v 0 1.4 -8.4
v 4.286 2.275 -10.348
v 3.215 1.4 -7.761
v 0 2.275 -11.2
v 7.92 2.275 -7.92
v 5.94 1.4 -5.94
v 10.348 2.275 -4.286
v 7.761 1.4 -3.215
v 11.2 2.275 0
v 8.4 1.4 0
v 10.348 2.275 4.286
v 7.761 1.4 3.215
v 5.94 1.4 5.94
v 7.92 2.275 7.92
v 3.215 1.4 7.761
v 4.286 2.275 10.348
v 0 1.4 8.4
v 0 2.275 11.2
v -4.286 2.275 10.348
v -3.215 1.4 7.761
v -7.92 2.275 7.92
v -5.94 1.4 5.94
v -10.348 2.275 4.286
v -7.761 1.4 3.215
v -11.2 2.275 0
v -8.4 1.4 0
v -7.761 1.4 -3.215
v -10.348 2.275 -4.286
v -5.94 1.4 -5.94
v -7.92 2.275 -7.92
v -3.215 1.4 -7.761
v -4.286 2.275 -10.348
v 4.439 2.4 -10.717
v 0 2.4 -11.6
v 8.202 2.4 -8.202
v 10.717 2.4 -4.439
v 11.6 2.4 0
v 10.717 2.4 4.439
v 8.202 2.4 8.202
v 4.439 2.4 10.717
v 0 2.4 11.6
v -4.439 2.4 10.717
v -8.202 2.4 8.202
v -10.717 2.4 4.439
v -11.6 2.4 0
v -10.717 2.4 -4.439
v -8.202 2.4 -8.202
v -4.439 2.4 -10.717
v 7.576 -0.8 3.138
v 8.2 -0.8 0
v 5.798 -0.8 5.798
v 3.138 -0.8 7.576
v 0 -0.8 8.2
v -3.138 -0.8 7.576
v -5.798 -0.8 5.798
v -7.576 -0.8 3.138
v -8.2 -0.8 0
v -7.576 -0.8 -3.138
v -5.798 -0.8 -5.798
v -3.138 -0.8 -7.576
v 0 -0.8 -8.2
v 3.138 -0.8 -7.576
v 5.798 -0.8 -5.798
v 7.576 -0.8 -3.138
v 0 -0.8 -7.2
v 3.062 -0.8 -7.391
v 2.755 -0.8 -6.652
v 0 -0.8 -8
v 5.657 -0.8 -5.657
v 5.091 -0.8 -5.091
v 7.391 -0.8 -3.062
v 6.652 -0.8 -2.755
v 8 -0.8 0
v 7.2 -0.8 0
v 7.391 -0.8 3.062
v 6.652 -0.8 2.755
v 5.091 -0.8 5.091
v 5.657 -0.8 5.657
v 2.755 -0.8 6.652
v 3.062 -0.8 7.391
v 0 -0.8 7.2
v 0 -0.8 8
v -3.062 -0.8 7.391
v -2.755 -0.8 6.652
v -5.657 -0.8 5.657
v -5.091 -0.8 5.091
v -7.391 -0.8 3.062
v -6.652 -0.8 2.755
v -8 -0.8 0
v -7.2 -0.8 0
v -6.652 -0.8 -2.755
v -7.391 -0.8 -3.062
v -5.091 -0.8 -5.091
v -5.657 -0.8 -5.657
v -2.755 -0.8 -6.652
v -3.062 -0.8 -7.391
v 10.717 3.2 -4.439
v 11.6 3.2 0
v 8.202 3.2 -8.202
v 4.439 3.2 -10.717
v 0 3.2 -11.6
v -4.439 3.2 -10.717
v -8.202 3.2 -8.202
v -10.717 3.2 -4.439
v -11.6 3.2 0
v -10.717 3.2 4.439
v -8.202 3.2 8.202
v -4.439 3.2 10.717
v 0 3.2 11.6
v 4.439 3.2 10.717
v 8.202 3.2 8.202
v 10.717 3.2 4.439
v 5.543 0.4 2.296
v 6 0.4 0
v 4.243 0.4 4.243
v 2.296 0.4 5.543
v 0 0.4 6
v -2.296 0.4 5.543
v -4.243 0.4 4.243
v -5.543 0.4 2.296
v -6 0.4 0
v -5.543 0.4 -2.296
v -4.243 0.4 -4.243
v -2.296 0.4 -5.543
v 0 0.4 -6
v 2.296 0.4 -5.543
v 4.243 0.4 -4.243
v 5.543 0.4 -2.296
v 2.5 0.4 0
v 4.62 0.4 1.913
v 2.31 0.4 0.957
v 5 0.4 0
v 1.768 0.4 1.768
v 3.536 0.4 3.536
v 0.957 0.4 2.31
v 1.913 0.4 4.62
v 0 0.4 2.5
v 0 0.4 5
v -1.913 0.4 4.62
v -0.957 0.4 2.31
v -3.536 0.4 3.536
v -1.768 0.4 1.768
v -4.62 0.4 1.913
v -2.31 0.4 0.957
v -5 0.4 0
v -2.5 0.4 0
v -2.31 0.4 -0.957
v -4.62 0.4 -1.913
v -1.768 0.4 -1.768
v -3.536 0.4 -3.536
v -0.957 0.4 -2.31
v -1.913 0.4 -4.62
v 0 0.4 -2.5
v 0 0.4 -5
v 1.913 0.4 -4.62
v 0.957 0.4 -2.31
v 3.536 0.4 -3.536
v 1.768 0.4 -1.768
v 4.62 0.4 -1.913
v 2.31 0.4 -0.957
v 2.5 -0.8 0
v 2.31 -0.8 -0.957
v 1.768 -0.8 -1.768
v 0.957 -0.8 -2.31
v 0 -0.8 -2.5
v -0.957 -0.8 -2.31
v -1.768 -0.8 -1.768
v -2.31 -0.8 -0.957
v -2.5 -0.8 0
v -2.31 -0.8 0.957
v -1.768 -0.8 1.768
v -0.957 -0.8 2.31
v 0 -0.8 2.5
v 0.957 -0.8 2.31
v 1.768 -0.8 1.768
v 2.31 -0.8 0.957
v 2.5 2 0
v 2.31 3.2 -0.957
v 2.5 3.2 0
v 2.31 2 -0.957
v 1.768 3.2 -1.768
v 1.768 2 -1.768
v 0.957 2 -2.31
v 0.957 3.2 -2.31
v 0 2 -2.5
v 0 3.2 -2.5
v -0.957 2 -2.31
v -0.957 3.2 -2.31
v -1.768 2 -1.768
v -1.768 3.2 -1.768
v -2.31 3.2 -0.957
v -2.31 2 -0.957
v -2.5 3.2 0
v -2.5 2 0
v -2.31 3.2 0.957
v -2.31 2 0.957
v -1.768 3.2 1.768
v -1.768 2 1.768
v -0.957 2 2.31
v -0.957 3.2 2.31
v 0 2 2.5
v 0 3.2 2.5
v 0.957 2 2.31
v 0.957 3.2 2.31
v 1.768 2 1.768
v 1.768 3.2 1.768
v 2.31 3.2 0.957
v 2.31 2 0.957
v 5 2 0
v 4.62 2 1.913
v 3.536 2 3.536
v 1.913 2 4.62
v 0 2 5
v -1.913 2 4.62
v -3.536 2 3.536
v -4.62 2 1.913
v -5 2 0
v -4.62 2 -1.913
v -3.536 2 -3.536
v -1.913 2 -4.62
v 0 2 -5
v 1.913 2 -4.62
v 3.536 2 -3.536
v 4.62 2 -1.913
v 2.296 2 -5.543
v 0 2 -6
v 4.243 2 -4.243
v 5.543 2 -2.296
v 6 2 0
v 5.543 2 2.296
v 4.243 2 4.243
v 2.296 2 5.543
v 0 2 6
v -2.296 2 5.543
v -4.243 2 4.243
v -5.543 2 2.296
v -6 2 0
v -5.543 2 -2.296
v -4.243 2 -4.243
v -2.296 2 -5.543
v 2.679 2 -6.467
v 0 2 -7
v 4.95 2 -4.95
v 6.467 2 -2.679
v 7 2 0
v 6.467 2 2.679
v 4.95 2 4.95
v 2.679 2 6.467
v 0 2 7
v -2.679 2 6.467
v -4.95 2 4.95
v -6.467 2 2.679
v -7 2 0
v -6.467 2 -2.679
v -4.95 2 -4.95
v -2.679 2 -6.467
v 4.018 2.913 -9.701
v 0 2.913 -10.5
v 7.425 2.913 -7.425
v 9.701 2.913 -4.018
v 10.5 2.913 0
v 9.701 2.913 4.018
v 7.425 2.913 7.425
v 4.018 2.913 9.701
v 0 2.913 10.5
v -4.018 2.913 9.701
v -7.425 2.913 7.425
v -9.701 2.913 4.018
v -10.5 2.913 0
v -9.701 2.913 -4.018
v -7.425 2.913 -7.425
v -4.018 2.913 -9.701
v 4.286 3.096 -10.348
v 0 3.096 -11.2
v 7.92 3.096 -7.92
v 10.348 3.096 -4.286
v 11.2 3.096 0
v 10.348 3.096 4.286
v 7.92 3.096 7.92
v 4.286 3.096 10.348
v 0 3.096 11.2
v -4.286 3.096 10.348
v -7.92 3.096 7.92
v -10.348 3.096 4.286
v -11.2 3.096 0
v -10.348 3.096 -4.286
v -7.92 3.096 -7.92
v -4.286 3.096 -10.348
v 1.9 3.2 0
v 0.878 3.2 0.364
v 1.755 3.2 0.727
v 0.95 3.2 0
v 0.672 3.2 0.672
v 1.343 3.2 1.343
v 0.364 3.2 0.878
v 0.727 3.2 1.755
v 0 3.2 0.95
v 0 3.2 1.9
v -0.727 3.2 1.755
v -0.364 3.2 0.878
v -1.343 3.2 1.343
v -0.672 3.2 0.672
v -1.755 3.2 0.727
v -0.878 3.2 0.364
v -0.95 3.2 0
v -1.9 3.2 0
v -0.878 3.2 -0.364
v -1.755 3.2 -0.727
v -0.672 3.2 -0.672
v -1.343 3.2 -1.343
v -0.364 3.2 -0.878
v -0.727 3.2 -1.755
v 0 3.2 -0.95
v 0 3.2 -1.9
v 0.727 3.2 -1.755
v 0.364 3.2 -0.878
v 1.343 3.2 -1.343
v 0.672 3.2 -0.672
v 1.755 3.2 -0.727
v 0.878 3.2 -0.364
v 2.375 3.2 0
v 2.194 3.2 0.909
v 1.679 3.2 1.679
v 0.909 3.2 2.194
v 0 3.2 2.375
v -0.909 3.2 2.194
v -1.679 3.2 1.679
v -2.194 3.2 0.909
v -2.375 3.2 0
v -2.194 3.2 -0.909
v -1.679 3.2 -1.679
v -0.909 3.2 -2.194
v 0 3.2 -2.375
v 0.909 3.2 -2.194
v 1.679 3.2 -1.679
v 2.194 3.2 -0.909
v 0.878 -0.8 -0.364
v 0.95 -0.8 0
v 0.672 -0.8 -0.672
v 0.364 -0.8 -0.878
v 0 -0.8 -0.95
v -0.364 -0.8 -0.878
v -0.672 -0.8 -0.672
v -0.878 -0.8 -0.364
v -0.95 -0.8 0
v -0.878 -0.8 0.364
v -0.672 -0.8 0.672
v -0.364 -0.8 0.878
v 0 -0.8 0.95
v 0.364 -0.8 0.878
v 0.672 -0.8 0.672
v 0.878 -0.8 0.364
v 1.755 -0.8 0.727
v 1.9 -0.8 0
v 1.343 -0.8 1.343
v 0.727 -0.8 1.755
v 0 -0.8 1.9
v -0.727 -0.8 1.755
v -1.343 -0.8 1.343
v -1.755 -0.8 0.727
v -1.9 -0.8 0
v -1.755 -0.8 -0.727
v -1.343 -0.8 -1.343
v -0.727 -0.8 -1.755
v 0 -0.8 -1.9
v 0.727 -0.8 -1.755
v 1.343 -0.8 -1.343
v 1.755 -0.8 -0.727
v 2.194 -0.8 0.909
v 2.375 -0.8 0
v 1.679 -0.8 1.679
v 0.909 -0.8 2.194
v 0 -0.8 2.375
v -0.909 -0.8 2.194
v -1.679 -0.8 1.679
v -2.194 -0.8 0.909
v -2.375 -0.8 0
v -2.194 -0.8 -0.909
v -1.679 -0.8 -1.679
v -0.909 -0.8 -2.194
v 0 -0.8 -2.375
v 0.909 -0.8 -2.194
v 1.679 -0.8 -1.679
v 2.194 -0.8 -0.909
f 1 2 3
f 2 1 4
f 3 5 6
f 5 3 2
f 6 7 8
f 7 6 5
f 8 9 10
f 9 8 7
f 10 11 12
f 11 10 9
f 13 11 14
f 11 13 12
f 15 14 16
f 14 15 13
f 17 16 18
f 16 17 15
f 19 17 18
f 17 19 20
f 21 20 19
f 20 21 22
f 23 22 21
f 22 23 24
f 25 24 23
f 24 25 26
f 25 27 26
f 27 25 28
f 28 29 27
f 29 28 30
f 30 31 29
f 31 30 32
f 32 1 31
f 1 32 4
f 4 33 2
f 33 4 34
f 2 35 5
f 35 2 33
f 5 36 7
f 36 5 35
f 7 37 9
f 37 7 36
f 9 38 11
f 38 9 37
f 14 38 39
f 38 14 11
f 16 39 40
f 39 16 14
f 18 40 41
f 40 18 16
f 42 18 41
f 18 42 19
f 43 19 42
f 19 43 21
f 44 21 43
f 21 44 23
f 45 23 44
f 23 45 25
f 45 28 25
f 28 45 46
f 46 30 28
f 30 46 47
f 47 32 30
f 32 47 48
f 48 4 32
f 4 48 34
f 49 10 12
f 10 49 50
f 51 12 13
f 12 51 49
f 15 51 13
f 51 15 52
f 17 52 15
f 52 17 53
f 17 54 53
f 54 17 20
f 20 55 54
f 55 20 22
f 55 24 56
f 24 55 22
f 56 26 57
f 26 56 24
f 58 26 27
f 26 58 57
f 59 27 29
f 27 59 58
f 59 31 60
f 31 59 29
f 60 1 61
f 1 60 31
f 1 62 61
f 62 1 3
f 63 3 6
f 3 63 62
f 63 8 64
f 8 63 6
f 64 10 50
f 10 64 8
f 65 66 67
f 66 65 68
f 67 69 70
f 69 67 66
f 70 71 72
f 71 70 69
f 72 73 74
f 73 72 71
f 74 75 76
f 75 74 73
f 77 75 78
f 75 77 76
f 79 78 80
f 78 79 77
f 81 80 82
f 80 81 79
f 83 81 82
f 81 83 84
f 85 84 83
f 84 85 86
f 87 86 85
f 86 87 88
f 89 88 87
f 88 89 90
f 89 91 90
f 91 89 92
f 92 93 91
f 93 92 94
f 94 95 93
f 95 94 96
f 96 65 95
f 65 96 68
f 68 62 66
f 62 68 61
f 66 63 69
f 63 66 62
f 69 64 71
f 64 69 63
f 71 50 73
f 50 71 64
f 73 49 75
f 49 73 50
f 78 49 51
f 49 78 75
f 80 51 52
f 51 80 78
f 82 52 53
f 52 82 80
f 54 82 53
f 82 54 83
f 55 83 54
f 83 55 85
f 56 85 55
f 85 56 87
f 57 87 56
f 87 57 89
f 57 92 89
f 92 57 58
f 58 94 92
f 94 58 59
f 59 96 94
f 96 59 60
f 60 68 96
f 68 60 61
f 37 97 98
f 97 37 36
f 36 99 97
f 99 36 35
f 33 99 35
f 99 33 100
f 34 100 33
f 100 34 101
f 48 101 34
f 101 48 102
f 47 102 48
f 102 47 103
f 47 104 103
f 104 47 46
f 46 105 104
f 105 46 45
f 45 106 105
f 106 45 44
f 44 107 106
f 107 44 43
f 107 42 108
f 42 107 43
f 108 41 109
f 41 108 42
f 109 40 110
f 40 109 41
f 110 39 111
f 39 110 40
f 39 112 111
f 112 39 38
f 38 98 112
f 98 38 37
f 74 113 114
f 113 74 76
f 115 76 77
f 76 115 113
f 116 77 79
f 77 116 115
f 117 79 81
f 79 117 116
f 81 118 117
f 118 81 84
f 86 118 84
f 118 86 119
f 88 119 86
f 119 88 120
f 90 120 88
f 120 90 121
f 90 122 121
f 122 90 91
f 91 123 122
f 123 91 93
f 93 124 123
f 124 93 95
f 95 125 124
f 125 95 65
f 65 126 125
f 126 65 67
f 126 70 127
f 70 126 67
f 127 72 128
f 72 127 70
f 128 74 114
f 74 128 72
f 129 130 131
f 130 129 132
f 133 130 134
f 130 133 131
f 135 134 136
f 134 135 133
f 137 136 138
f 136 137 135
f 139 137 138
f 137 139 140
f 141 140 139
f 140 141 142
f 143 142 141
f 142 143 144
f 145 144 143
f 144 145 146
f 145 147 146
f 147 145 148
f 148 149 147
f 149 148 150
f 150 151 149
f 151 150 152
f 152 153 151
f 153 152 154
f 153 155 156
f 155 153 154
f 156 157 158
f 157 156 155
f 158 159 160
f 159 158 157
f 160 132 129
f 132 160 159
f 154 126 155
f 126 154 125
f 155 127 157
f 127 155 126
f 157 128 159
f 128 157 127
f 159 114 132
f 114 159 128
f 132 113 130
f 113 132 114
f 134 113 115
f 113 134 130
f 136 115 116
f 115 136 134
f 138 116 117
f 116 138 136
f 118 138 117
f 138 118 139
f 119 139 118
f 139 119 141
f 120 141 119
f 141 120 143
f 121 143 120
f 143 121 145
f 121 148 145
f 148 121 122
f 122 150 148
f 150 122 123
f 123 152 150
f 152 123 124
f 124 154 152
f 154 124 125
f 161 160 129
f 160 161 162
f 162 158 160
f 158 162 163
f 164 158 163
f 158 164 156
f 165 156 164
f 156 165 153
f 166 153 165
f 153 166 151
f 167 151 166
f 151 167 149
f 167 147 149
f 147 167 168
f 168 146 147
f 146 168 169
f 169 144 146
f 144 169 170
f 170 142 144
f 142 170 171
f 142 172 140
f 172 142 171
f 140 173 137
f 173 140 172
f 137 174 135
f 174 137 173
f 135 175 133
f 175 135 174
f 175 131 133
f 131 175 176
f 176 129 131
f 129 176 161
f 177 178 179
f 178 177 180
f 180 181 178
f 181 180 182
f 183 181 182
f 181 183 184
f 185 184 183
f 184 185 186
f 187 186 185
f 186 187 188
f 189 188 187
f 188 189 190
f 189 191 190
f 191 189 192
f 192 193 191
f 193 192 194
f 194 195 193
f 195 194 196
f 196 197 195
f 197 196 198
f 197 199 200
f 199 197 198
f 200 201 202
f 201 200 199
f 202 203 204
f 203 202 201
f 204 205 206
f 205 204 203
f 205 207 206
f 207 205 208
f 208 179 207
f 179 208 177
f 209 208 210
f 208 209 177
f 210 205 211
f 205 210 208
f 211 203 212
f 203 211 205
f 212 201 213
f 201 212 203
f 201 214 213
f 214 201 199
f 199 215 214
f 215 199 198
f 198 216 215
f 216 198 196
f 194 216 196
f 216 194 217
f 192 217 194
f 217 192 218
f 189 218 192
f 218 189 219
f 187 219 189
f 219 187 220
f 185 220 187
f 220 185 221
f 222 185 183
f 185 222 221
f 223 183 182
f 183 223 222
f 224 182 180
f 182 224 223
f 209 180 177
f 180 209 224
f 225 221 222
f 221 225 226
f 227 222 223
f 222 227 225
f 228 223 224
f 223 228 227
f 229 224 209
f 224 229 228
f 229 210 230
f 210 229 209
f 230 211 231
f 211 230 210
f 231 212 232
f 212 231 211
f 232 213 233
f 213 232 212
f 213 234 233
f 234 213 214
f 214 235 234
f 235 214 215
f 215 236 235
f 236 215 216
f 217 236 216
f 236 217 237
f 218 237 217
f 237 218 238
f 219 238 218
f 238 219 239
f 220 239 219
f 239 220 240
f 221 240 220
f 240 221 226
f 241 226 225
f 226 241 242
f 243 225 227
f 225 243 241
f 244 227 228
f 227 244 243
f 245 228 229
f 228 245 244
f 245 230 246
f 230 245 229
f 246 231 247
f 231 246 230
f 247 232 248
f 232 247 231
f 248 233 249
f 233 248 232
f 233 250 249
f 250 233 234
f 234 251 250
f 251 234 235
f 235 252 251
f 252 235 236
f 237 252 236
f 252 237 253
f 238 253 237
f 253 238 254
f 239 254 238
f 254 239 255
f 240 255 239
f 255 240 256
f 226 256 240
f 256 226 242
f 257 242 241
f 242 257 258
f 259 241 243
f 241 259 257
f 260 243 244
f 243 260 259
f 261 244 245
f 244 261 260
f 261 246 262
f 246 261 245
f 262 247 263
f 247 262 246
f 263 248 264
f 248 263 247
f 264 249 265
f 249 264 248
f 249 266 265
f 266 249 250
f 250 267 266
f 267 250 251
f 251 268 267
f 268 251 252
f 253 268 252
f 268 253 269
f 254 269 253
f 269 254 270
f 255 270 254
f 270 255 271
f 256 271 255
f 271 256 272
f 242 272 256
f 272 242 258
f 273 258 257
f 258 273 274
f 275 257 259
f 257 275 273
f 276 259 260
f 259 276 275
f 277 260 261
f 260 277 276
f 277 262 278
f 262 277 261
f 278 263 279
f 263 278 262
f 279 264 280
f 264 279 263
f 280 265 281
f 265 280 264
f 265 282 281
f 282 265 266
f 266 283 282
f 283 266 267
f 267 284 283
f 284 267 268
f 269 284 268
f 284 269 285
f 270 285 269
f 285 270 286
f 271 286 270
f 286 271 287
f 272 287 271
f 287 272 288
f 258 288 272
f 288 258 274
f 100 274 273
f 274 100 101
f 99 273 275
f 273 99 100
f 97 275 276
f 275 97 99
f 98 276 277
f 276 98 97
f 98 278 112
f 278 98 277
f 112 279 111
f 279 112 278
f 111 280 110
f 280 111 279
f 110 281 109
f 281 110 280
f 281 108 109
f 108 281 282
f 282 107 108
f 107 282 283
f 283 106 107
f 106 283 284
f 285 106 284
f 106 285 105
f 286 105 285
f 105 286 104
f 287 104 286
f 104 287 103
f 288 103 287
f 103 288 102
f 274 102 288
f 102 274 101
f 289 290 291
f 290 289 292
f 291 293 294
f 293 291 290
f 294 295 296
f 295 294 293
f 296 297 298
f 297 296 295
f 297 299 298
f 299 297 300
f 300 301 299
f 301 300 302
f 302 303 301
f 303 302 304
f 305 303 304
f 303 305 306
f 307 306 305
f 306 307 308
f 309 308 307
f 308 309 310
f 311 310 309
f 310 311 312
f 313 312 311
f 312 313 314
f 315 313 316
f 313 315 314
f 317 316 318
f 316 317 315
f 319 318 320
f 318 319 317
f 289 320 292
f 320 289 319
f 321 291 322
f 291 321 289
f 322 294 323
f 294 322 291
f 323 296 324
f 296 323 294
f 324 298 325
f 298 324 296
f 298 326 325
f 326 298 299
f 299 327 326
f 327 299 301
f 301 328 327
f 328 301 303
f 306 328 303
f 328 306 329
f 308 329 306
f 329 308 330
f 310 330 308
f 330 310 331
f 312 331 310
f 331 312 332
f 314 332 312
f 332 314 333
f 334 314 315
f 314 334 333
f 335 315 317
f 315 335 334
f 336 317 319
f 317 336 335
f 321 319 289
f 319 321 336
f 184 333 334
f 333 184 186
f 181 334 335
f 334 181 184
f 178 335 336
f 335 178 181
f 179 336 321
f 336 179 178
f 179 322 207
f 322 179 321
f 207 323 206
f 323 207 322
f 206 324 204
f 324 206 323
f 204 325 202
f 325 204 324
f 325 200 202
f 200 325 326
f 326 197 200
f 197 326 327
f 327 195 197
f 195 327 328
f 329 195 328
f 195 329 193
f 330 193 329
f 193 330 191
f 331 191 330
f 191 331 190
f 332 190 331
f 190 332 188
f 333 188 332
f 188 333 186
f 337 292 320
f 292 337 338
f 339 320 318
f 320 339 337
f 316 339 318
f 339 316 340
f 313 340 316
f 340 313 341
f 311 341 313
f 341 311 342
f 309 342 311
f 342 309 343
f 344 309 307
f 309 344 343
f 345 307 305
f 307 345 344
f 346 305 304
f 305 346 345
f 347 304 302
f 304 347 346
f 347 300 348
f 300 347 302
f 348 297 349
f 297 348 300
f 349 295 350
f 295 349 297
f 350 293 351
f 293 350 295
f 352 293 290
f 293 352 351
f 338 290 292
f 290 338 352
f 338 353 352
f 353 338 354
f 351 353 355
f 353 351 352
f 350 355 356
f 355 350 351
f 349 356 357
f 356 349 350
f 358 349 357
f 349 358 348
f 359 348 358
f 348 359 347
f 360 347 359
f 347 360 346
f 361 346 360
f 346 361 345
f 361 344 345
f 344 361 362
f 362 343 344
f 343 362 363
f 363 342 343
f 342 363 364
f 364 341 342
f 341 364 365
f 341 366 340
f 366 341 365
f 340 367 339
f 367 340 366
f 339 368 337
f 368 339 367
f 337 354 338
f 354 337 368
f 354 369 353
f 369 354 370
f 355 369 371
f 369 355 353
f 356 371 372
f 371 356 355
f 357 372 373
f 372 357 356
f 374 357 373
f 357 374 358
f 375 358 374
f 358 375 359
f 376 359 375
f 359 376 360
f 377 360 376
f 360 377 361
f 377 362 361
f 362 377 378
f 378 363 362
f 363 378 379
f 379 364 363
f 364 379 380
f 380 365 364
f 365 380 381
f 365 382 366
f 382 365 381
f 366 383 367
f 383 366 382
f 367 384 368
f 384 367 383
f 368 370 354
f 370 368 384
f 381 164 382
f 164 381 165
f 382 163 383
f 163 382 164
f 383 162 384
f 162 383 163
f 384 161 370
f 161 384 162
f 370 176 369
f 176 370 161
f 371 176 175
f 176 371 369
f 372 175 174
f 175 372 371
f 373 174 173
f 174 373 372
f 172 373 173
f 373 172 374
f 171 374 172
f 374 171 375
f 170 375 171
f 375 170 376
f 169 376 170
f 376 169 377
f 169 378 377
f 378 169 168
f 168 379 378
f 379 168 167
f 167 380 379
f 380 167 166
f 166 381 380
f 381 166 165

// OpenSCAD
use <../lib.scad>
use <../p/4-4cylo.scad>
use <../p/4-4rin19.scad>
use <../p/4-4ring1.scad>
use <../p/4-4ring4.scad>
use <s/2879s01.scad>
function ldraw_lib__2879() = [
// 0 ~Train Wheel with Open Centre for Wheel Bogie
// 0 Name: 2879.dat
// 0 Author: James Jessiman
// 0 !LDRAW_ORG Part UPDATE 2013-02
// 0 !LICENSE Licensed under CC BY 4.0 : see CAreadme.txt
// 
// 0 BFC CERTIFY CCW
  [0,"BFC","CERTIFY"],
  [0,"BFC","CCW"],
// 
// 0 !HISTORY 2002-12-12 [cwdee] Updated header, minor corrections, BFC compliance
// 0 !HISTORY 2003-01-12 [cwdee] Increased use of primtives, recalculated outer cone
// 0 !HISTORY 2003-12-19 [PTadmin] Official Update 2003-03
// 0 !HISTORY 2007-05-20 [PTadmin] Header formatted for Contributor Agreement
// 0 !HISTORY 2008-07-01 [PTadmin] Official Update 2008-01
// 0 !HISTORY 2013-06-29 [MMR1988] Used reworked Subfile
// 0 !HISTORY 2013-12-23 [PTadmin] Official Update 2013-02
// 
// 
// 1 16 0 0 0 1 0 0 0 1 0 0 0 1 s\2879s01.dat
  [1,16,0,0,0,1,0,0,0,1,0,0,0,1, ldraw_lib__s__2879s01()],
// 
// 1 16 0 0 8 0 0 2.375 2.375 0 0 0 -1 0 4-4ring1.dat
  [1,16,0,0,8,0,0,2.375,2.375,0,0,0,-1,0, ldraw_lib__4_4ring1()],
// 1 16 0 0 8 0 0 1.1875 1.1875 0 0 0 -1 0 4-4ring4.dat
  [1,16,0,0,8,0,0,1.1875,1.1875,0,0,0,-1,0, ldraw_lib__4_4ring4()],
// 1 16 0 0 8 0 0 0.3125 0.3125 0 0 0 -1 0 4-4rin19.dat
  [1,16,0,0,8,0,0,0.3125,0.3125,0,0,0,-1,0, ldraw_lib__4_4rin19()],
// 0 BFC INVERTNEXT
  [0,"BFC","INVERTNEXT"],
// 1 16 0 0 8 2.375 0 0 0 0 2.375 0 -10 0 4-4cylo.dat
  [1,16,0,0,8,2.375,0,0,0,0,2.375,0,-10,0, ldraw_lib__4_4cylo()],
// 1 16 0 0 -2 0 0 2.375 2.375 0 0 0 1 0 4-4ring1.dat
  [1,16,0,0,-2,0,0,2.375,2.375,0,0,0,1,0, ldraw_lib__4_4ring1()],
// 1 16 0 0 -2 0 0 1.1875 1.1875 0 0 0 1 0 4-4ring4.dat
  [1,16,0,0,-2,0,0,1.1875,1.1875,0,0,0,1,0, ldraw_lib__4_4ring4()],
// 1 16 0 0 -2 0 0 0.3125 0.3125 0 0 0 1 0 4-4rin19.dat
  [1,16,0,0,-2,0,0,0.3125,0.3125,0,0,0,1,0, ldraw_lib__4_4rin19()],
];
module ldraw_lib__2879(step=0, col=false, unit=2/5, alt=false, line=0.2, solid=!$preview)
    makepoly(ldraw_lib__2879(), step=step, col=col, unit=unit, alt=alt, line=line, solid=solid);
ldraw_lib__2879(line=0.2);
